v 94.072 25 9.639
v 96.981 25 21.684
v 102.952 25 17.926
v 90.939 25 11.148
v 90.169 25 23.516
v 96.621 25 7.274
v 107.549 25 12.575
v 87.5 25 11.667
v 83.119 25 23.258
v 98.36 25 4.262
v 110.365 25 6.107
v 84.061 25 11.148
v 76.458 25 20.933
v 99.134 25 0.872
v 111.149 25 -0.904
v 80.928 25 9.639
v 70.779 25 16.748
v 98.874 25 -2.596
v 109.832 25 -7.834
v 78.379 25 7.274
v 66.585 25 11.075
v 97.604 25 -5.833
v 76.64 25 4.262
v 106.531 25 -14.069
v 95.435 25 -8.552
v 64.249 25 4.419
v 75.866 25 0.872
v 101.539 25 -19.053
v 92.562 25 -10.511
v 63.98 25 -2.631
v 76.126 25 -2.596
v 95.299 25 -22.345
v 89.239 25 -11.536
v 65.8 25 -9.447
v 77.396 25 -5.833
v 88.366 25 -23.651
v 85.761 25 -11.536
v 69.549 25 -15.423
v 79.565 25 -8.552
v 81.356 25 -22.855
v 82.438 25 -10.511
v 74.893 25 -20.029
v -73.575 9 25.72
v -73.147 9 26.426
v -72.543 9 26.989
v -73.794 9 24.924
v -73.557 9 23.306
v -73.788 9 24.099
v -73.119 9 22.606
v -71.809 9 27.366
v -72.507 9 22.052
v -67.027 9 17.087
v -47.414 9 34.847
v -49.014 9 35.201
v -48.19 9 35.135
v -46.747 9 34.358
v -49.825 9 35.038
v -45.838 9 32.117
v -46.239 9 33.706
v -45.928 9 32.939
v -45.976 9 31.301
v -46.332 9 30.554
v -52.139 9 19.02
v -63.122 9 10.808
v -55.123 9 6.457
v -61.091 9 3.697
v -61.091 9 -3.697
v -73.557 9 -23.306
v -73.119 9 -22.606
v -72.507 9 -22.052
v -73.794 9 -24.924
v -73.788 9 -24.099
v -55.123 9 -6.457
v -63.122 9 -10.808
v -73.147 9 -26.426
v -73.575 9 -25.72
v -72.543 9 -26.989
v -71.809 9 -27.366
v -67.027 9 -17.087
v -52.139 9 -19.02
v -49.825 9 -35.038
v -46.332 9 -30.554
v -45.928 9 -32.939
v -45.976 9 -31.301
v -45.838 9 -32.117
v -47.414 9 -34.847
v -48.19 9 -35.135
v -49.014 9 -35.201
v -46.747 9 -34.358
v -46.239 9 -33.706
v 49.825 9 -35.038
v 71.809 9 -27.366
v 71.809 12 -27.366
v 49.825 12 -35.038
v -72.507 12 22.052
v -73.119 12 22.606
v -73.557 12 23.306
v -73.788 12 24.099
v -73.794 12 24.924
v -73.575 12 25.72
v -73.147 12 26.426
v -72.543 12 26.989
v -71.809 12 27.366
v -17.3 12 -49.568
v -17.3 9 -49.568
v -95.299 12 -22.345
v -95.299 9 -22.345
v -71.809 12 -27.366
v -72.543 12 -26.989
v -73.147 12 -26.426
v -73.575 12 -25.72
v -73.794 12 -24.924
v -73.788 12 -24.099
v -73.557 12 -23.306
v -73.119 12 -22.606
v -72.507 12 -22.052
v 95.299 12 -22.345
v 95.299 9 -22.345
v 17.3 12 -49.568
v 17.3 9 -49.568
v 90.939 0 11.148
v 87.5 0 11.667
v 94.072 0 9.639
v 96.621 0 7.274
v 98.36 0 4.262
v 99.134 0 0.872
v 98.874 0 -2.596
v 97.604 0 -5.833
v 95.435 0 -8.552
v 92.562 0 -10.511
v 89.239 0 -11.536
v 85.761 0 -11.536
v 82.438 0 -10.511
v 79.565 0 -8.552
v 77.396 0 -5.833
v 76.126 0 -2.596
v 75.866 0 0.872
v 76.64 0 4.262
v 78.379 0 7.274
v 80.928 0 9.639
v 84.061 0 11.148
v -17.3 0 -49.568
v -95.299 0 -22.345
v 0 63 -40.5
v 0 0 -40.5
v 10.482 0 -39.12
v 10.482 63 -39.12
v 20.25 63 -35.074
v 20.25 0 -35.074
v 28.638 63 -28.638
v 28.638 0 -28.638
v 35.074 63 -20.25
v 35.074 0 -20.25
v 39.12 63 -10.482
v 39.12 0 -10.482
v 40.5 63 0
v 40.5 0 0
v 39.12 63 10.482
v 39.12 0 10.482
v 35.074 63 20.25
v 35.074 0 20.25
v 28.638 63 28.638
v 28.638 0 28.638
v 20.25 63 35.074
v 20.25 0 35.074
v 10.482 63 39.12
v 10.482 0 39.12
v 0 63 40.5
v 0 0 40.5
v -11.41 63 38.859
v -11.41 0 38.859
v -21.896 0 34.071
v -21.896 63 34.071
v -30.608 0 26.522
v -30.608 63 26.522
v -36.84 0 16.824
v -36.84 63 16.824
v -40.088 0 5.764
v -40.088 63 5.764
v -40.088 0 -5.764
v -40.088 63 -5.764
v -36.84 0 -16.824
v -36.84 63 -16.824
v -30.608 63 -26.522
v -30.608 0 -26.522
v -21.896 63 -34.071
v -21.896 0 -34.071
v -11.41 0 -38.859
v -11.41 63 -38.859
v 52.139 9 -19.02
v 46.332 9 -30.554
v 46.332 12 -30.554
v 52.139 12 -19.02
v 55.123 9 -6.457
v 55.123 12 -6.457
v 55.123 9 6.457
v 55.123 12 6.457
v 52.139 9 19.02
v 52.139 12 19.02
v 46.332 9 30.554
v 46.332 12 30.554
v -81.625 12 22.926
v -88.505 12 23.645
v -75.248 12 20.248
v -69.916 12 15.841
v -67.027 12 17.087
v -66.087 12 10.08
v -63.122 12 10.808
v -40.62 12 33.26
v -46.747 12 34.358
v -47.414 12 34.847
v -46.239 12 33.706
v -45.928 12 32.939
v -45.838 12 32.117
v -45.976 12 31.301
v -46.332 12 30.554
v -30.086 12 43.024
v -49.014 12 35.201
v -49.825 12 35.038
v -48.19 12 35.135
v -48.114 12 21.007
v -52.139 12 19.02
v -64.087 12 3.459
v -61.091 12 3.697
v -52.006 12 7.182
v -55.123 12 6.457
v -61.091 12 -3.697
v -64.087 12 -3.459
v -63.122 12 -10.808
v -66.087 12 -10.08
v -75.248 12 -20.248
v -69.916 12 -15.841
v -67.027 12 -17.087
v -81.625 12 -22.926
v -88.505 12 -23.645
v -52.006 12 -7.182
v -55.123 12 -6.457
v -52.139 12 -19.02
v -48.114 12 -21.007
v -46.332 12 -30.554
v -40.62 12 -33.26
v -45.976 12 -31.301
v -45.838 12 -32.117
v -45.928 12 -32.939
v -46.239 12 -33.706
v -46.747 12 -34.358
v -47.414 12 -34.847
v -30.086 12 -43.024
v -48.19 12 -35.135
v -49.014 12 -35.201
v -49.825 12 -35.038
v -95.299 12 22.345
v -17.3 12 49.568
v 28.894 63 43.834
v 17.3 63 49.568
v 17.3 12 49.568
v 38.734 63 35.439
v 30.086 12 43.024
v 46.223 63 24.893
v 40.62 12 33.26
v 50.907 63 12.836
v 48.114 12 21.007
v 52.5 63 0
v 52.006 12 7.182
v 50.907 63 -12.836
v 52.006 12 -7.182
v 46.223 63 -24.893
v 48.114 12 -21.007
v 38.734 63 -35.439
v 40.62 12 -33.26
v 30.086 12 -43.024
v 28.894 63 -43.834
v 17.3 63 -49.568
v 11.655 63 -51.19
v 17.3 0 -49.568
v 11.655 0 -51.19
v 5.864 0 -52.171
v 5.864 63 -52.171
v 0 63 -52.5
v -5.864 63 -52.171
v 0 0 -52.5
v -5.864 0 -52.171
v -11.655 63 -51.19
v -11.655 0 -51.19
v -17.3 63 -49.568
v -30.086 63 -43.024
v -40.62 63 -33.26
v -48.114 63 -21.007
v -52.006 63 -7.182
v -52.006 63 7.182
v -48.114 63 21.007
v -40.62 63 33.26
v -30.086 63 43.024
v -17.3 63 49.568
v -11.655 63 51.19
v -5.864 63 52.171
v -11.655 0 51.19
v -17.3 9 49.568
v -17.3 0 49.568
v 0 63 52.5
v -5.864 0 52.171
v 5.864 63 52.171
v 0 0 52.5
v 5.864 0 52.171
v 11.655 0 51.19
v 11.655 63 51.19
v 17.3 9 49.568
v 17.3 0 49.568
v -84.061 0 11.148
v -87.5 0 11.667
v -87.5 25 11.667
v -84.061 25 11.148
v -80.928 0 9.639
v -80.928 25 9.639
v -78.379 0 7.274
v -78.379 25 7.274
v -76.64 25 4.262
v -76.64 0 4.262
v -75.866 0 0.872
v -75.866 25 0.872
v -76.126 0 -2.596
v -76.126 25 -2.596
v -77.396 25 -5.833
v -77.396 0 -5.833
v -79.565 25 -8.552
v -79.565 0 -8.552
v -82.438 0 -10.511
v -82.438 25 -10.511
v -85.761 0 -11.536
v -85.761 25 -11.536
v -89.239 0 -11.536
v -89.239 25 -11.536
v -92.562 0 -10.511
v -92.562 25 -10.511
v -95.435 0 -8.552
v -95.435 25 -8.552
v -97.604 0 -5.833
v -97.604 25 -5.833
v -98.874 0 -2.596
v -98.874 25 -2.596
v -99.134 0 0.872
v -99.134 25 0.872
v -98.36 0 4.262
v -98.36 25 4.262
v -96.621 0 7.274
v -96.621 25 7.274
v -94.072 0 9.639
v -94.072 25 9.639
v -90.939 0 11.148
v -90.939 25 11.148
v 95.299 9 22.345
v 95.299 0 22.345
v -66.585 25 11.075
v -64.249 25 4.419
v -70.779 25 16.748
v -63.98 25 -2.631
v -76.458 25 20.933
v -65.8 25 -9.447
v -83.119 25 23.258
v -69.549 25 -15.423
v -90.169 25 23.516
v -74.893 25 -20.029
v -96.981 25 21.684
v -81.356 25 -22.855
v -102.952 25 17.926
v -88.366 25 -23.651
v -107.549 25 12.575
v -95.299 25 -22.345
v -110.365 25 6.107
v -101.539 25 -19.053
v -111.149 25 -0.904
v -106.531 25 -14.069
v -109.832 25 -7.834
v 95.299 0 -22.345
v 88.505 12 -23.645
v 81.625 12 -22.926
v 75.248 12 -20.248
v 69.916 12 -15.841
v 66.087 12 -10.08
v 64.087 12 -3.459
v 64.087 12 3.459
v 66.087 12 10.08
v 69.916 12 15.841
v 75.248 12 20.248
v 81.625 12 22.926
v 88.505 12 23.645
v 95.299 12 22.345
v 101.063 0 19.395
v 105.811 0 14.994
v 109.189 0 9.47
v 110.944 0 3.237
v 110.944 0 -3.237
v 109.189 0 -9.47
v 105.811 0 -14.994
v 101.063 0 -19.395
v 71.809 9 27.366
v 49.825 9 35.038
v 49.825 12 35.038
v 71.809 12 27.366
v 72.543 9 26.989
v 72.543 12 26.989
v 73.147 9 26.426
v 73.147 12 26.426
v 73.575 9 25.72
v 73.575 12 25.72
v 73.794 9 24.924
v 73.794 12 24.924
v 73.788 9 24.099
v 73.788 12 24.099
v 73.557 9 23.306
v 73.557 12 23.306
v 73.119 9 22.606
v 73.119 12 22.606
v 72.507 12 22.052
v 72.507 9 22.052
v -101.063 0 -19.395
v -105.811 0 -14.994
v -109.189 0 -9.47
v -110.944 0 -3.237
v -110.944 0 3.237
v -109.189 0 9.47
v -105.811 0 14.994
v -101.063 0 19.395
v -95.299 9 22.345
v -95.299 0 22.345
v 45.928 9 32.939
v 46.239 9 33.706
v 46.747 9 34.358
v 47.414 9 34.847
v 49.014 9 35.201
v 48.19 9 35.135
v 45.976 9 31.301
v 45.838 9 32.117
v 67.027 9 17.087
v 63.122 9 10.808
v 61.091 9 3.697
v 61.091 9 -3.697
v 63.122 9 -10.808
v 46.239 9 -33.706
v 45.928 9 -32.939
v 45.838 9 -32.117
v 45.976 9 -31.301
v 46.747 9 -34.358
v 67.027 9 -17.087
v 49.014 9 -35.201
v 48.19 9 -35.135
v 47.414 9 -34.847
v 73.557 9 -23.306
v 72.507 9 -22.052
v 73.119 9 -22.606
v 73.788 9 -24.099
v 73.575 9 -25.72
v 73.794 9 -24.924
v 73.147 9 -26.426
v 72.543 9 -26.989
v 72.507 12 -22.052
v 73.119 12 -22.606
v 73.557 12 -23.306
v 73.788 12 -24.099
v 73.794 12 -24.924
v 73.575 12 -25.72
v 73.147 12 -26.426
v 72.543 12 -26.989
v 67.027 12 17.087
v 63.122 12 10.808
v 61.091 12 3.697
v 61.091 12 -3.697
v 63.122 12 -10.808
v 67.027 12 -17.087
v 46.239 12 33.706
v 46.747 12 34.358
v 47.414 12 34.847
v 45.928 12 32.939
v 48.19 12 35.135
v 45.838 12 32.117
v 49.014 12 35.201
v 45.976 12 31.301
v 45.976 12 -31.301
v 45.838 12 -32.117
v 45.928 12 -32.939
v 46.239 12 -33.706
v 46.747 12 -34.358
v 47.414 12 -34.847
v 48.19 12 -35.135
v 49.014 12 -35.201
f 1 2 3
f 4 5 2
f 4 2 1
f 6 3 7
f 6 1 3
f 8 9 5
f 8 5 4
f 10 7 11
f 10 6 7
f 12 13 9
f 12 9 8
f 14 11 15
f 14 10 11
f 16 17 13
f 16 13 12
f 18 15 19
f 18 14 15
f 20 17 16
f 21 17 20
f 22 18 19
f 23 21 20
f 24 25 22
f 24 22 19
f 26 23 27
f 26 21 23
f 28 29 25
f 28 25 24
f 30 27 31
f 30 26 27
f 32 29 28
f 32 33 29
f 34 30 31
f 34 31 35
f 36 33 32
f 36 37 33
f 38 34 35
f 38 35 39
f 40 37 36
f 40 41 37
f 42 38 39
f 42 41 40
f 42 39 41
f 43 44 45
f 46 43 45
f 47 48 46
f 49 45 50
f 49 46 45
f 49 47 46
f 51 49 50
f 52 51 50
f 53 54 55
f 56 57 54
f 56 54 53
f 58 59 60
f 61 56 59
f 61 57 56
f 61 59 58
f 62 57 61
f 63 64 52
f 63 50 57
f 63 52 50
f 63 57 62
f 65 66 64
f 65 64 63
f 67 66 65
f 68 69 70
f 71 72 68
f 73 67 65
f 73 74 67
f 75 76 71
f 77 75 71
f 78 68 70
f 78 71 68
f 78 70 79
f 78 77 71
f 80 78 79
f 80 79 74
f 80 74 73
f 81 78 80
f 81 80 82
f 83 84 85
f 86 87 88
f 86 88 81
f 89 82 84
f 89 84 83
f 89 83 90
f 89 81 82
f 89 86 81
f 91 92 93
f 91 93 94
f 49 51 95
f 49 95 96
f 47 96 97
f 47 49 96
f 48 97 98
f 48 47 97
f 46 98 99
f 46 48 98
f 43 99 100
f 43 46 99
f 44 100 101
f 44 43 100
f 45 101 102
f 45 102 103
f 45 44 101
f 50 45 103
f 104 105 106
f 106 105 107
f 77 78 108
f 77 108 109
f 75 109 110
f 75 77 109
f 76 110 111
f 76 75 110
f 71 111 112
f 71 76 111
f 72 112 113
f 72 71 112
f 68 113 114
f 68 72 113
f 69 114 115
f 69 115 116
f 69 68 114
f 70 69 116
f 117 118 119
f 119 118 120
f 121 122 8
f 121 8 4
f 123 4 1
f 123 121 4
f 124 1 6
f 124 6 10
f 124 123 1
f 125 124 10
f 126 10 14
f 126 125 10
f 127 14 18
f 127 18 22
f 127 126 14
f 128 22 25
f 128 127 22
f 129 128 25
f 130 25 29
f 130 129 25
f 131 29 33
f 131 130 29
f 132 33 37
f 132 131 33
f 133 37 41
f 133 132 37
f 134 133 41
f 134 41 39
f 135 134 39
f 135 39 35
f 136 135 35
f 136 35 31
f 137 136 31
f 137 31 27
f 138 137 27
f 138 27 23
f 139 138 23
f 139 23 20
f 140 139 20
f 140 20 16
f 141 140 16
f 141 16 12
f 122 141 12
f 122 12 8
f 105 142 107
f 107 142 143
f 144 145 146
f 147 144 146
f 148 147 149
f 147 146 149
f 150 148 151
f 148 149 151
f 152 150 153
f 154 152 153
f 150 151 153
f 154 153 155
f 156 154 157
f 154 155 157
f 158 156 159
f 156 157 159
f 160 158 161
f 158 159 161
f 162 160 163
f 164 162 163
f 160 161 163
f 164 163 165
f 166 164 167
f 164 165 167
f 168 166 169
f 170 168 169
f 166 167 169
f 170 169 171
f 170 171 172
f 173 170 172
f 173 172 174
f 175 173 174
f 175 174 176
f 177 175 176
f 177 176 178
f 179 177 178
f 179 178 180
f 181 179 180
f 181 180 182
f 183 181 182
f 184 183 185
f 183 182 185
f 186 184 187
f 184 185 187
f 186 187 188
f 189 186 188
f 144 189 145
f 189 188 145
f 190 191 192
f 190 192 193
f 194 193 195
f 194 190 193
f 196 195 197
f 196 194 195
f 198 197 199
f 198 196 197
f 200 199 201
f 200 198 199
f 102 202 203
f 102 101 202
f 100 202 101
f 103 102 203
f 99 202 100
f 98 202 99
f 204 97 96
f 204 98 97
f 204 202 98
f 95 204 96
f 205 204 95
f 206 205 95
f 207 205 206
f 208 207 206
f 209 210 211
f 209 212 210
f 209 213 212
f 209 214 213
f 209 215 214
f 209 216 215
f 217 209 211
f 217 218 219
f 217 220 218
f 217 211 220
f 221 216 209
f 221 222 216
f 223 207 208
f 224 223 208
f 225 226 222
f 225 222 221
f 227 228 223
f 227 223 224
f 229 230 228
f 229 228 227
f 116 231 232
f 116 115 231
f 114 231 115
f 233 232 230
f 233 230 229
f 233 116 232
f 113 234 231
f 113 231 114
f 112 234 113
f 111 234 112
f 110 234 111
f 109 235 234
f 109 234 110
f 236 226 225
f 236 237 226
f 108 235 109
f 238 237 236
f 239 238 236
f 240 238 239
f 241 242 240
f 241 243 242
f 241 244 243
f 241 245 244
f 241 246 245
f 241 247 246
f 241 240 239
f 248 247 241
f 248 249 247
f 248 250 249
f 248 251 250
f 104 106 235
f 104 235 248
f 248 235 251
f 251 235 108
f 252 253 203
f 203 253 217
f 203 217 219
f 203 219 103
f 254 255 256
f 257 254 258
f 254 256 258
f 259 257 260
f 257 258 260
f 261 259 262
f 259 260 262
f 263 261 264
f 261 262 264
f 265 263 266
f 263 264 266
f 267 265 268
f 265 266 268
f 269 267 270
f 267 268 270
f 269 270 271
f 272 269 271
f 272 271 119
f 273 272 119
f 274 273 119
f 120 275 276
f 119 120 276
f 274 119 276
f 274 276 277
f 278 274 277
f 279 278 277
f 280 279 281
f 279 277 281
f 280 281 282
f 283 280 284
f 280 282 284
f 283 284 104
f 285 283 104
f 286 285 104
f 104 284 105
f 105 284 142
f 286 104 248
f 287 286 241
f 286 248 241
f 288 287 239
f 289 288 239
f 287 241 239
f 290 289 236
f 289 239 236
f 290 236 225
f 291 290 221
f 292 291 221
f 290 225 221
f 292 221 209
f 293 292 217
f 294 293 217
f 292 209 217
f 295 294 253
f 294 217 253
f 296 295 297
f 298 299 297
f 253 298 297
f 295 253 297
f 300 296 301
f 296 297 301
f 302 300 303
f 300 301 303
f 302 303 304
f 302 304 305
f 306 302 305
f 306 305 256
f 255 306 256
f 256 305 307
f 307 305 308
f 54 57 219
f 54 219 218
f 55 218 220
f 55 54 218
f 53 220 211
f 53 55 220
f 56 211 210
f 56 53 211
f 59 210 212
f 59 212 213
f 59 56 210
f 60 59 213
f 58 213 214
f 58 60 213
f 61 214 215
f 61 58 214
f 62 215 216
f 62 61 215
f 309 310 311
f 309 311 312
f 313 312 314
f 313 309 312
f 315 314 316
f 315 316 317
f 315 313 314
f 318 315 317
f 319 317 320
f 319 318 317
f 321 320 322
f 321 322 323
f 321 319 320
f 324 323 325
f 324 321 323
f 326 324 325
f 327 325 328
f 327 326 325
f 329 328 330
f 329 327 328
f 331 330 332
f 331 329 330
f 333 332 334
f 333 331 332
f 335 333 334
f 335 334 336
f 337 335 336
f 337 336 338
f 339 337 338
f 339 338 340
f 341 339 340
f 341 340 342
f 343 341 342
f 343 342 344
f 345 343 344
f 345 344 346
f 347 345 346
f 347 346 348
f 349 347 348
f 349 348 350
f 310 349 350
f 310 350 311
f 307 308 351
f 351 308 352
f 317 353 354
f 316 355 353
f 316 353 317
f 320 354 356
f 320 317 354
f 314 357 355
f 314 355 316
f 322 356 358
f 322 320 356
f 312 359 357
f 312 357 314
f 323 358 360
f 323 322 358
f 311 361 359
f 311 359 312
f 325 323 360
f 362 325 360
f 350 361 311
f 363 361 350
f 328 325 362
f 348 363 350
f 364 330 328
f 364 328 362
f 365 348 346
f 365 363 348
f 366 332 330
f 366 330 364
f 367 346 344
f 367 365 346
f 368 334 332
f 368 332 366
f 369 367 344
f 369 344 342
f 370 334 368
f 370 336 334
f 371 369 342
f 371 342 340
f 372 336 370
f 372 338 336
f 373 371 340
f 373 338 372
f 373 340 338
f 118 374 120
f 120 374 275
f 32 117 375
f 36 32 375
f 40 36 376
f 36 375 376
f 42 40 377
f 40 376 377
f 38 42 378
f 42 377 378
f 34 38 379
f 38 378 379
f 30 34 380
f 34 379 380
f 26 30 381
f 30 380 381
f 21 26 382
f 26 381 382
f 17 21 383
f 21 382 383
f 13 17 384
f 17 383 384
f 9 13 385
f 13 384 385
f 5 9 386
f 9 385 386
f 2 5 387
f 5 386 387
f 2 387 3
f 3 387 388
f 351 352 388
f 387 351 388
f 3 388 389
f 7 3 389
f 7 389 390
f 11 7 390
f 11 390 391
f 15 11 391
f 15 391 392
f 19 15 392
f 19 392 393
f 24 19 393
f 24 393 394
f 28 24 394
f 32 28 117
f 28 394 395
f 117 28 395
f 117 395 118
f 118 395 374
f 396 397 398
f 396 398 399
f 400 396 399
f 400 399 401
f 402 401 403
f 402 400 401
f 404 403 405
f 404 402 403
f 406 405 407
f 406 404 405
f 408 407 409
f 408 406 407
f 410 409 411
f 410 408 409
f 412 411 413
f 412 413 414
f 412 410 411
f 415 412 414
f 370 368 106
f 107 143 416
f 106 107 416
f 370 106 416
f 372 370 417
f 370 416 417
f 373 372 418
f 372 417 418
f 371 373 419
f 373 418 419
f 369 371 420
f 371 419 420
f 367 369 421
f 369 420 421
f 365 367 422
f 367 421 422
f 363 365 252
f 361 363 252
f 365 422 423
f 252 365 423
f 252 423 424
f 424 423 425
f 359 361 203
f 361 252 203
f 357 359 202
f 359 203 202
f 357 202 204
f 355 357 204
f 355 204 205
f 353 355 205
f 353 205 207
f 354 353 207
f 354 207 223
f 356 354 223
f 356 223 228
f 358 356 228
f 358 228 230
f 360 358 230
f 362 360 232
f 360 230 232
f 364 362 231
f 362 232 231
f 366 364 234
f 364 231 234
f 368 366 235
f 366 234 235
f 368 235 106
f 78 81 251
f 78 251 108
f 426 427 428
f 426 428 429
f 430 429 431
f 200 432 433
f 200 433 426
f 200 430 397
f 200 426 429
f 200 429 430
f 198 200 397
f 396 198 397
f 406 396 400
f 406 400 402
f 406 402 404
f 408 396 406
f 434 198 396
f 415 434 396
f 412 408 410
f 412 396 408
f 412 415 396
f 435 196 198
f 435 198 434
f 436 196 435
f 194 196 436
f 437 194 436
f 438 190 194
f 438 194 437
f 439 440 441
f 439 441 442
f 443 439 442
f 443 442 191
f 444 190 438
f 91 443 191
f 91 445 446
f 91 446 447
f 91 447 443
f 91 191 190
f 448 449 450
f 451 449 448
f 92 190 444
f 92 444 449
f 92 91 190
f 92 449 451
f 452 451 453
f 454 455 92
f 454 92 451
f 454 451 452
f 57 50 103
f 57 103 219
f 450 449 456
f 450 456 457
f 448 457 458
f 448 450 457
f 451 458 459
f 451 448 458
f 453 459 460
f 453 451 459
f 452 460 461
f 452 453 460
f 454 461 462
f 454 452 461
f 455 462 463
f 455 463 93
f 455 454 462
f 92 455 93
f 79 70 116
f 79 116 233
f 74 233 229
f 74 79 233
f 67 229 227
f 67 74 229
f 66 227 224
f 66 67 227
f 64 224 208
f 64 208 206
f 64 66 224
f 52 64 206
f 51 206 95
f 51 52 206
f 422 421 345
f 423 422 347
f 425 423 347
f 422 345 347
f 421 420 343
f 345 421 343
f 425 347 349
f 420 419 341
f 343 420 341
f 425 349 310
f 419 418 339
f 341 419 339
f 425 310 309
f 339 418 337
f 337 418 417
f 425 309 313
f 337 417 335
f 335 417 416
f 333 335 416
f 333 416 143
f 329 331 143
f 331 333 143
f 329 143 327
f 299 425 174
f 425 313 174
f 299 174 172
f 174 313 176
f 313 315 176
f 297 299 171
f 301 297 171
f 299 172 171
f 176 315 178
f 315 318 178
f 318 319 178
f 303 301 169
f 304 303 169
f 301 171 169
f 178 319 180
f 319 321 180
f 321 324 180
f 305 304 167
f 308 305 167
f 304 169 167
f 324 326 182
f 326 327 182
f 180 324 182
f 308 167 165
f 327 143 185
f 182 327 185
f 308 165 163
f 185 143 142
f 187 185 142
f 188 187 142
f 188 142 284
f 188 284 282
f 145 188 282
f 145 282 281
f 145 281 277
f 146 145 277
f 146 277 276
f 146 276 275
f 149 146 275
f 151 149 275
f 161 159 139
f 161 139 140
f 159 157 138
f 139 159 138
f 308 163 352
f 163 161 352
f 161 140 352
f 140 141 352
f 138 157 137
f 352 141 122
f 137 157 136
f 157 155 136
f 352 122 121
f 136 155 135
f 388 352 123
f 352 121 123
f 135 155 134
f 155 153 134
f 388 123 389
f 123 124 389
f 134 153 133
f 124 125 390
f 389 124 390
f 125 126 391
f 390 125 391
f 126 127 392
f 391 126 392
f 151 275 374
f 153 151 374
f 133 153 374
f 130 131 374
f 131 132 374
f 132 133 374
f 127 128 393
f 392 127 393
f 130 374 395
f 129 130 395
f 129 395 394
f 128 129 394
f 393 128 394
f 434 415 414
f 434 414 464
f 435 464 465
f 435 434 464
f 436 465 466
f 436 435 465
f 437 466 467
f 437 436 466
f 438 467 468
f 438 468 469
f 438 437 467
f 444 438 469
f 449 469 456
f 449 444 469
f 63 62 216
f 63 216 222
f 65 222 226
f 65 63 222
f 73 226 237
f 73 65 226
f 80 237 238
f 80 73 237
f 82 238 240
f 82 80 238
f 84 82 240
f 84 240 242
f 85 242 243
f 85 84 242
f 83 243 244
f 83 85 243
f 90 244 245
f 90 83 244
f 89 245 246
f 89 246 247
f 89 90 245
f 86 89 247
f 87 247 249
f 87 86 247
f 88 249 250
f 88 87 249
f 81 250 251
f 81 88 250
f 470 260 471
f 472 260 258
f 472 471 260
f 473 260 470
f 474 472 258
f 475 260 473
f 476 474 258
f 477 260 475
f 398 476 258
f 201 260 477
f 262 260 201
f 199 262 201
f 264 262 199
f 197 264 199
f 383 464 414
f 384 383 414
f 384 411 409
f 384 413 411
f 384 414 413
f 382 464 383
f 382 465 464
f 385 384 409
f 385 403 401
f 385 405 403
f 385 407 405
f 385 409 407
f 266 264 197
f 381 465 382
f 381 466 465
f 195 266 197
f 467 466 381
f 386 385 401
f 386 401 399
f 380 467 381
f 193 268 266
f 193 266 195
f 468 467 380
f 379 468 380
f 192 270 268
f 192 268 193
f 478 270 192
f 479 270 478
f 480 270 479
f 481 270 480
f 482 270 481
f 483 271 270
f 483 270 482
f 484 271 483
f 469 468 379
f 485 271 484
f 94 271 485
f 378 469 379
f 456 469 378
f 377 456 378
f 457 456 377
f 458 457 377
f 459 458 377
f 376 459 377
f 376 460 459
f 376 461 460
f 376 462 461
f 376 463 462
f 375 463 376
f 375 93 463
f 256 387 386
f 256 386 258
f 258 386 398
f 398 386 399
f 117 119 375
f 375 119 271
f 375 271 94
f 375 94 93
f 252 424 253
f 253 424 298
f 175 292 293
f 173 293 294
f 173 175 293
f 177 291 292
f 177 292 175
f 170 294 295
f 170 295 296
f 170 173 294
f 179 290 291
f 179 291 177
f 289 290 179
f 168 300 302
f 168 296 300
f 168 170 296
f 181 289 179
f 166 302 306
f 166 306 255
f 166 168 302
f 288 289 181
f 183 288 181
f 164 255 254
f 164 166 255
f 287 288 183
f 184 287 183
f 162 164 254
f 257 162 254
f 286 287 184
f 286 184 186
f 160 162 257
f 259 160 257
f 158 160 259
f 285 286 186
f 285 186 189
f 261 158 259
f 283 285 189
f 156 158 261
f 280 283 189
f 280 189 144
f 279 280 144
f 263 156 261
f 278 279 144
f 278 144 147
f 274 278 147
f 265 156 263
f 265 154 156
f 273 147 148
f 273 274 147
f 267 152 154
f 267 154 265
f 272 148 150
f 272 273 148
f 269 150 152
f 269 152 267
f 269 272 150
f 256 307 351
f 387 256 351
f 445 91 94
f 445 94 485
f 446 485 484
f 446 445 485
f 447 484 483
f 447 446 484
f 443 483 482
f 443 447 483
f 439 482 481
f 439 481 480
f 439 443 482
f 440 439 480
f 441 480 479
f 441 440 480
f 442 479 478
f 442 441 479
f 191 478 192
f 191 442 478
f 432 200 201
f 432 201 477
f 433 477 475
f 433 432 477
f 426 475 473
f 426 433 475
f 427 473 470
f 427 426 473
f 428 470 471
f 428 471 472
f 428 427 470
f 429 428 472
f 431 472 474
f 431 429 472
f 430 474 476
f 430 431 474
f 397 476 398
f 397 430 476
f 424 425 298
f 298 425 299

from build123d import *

# Parameters (mm, degrees)
SKETCH1_R           = 23.666666667
SKETCH1_R_2         = 11.666666667
BOSS_EXTRUDE1_DEPTH = 9
SKETCH1_5_R         = 23.666666667
SKETCH1_5_R_2       = 11.666666667
BOSS_EXTRUDE2_DEPTH = 25
BOSS_EXTRUDE3_DEPTH = 63
BOSS_EXTRUDE4_DEPTH = 3


with BuildPart() as part:
    # Sketch1 → Boss-Extrude1 (new body)
    # profile 1 of 8: a face of its own
    with BuildSketch(Plane(origin=(0, 0, 0), x_dir=(1, 0, 0), z_dir=(0, 1, 0))):
        with Locations((-87.5, 0)):
            Circle(SKETCH1_R)
        with Locations(Location((-87.5, 0, 0), (0, 0, 270))):
            Circle(SKETCH1_R_2, mode=Mode.SUBTRACT)
    # profile 2 of 8: a face of its own
    with BuildSketch(Plane(origin=(0, 0, 0), x_dir=(1, 0, 0), z_dir=(0, 1, 0))):
        with BuildLine():
            ThreePointArc((-17.3, -49.567731439), (-52.5, 0), (-17.3, 49.567731439))
            Line((-17.3, 49.567731439), (-95.298730159, 22.344818617))
            ThreePointArc((-95.298730159, 22.344818617), (-73.797059366, 19.296127308), (-63.833333333, 0))
            ThreePointArc((-63.833333333, 0), (-73.797059366, -19.296127308), (-95.298730159, -22.344818617))
            Line((-95.298730159, -22.344818617), (-17.3, -49.567731439))
        make_face()
    # profile 3 of 8: a face of its own
    with BuildSketch(Plane(origin=(0, 0, 0), x_dir=(1, 0, 0), z_dir=(0, 1, 0))):
        with BuildLine():
            ThreePointArc((52.5, 0), (42.804789452, 30.397368307), (17.3, 49.567731439))
            ThreePointArc((17.3, 49.567731439), (8.773371628, 51.761742149), (0, 52.5))
            Line((0, 52.5), (0, 40.5))
            ThreePointArc((0, 40.5), (28.637824638, 28.637824638), (40.5, 0))
            ThreePointArc((40.5, 0), (28.637824638, -28.637824638), (0, -40.5))
            Line((0, -40.5), (0, -52.5))
            ThreePointArc((0, -52.5), (8.773371628, -51.761742149), (17.3, -49.567731439))
            ThreePointArc((17.3, -49.567731439), (42.804789452, -30.397368307), (52.5, 0))
        make_face()
    # profile 4 of 8: a face of its own
    with BuildSketch(Plane(origin=(0, 0, 0), x_dir=(1, 0, 0), z_dir=(0, 1, 0))):
        with BuildLine():
            Line((0, 40.5), (0, 52.5))
            ThreePointArc((0, 52.5), (-8.773371628, 51.761742149), (-17.3, 49.567731439))
            ThreePointArc((-17.3, 49.567731439), (-52.5, 0), (-17.3, -49.567731439))
            ThreePointArc((-17.3, -49.567731439), (-8.773371628, -51.761742149), (0, -52.5))
            Line((0, -52.5), (0, -40.5))
            ThreePointArc((0, -40.5), (-40.5, 0), (0, 40.5))
        make_face()
    # profile 5 of 8: a face of its own
    with BuildSketch(Plane(origin=(0, 0, 0), x_dir=(1, 0, 0), z_dir=(0, 1, 0))):
        with BuildLine():
            ThreePointArc((52.5, 0), (42.804789452, 30.397368307), (17.3, 49.567731439))
            ThreePointArc((17.3, 49.567731439), (8.773371628, 51.761742149), (0, 52.5))
            Line((0, 52.5), (0, 40.5))
            ThreePointArc((0, 40.5), (28.637824638, 28.637824638), (40.5, 0))
            ThreePointArc((40.5, 0), (28.637824638, -28.637824638), (0, -40.5))
            Line((0, -40.5), (0, -52.5))
            ThreePointArc((0, -52.5), (8.773371628, -51.761742149), (17.3, -49.567731439))
            ThreePointArc((17.3, -49.567731439), (42.804789452, -30.397368307), (52.5, 0))
        make_face()
    # profile 6 of 8: a face of its own
    with BuildSketch(Plane(origin=(0, 0, 0), x_dir=(1, 0, 0), z_dir=(0, 1, 0))):
        with BuildLine():
            Line((0, 40.5), (0, 52.5))
            ThreePointArc((0, 52.5), (-8.773371628, 51.761742149), (-17.3, 49.567731439))
            ThreePointArc((-17.3, 49.567731439), (-52.5, 0), (-17.3, -49.567731439))
            ThreePointArc((-17.3, -49.567731439), (-8.773371628, -51.761742149), (0, -52.5))
            Line((0, -52.5), (0, -40.5))
            ThreePointArc((0, -40.5), (-40.5, 0), (0, 40.5))
        make_face()
    # profile 7 of 8: a face of its own
    with BuildSketch(Plane(origin=(0, 0, 0), x_dir=(1, 0, 0), z_dir=(0, 1, 0))):
        with BuildLine():
            Line((95.298730159, 22.344818617), (17.3, 49.567731439))
            ThreePointArc((17.3, 49.567731439), (42.804789452, 30.397368307), (52.5, 0))
            ThreePointArc((52.5, 0), (42.804789452, -30.397368307), (17.3, -49.567731439))
            Line((17.3, -49.567731439), (95.298730159, -22.344818617))
            ThreePointArc((95.298730159, -22.344818617), (63.833333333, 0), (95.298730159, 22.344818617))
        make_face()
    # profile 8 of 8: a face of its own
    with BuildSketch(Plane(origin=(0, 0, 0), x_dir=(1, 0, 0), z_dir=(0, 1, 0))):
        with Locations((87.5, 0)):
            Circle(SKETCH1_R)
        with Locations(Location((87.5, 0, 0), (0, 0, 270))):
            Circle(SKETCH1_R_2, mode=Mode.SUBTRACT)
    extrude(amount=BOSS_EXTRUDE1_DEPTH)

    # Sketch1<5> → Boss-Extrude2 (add)
    # profile 1 of 2: a face of its own
    with BuildSketch(Plane(origin=(0, 0, 0), x_dir=(1, 0, 0), z_dir=(0, 1, 0))):
        with Locations(Location((-87.5, 0, 0), (0, 0, 109.239875225))):
            Circle(SKETCH1_5_R)
        with Locations(Location((-87.5, 0, 0), (0, 0, 270))):
            Circle(SKETCH1_5_R_2, mode=Mode.SUBTRACT)
    # profile 2 of 2: a face of its own
    with BuildSketch(Plane(origin=(0, 0, 0), x_dir=(1, 0, 0), z_dir=(0, 1, 0))):
        with Locations(Location((87.5, 0, 0), (0, 0, 70.760124775))):
            Circle(SKETCH1_5_R)
        with Locations(Location((87.5, 0, 0), (0, 0, 270))):
            Circle(SKETCH1_5_R_2, mode=Mode.SUBTRACT)
    extrude(amount=BOSS_EXTRUDE2_DEPTH)

    # Sketch1<4> → Boss-Extrude3 (add)
    with BuildSketch(Plane(origin=(0, 0, 0), x_dir=(1, 0, 0), z_dir=(0, 1, 0))):
        with BuildLine():
            ThreePointArc((52.5, 0), (42.804789452, 30.397368307), (17.3, 49.567731439))
            ThreePointArc((17.3, 49.567731439), (8.773371628, 51.761742149), (0, 52.5))
            Line((0, 52.5), (0, 40.5))
            ThreePointArc((0, 40.5), (28.637824638, 28.637824638), (40.5, 0))
            ThreePointArc((40.5, 0), (28.637824638, -28.637824638), (0, -40.5))
            Line((0, -40.5), (0, -52.5))
            ThreePointArc((0, -52.5), (8.773371628, -51.761742149), (17.3, -49.567731439))
            ThreePointArc((17.3, -49.567731439), (42.804789452, -30.397368307), (52.5, 0))
        make_face()
        with BuildLine():
            Line((0, 40.5), (0, 52.5))
            ThreePointArc((0, 52.5), (-8.773371628, 51.761742149), (-17.3, 49.567731439))
            ThreePointArc((-17.3, 49.567731439), (-52.5, 0), (-17.3, -49.567731439))
            ThreePointArc((-17.3, -49.567731439), (-8.773371628, -51.761742149), (0, -52.5))
            Line((0, -52.5), (0, -40.5))
            ThreePointArc((0, -40.5), (-40.5, 0), (0, 40.5))
        make_face()
        with BuildLine():
            ThreePointArc((52.5, 0), (42.804789452, 30.397368307), (17.3, 49.567731439))
            ThreePointArc((17.3, 49.567731439), (8.773371628, 51.761742149), (0, 52.5))
            Line((0, 52.5), (0, 40.5))
            ThreePointArc((0, 40.5), (28.637824638, 28.637824638), (40.5, 0))
            ThreePointArc((40.5, 0), (28.637824638, -28.637824638), (0, -40.5))
            Line((0, -40.5), (0, -52.5))
            ThreePointArc((0, -52.5), (8.773371628, -51.761742149), (17.3, -49.567731439))
            ThreePointArc((17.3, -49.567731439), (42.804789452, -30.397368307), (52.5, 0))
        make_face()
        with BuildLine():
            Line((0, 40.5), (0, 52.5))
            ThreePointArc((0, 52.5), (-8.773371628, 51.761742149), (-17.3, 49.567731439))
            ThreePointArc((-17.3, 49.567731439), (-52.5, 0), (-17.3, -49.567731439))
            ThreePointArc((-17.3, -49.567731439), (-8.773371628, -51.761742149), (0, -52.5))
            Line((0, -52.5), (0, -40.5))
            ThreePointArc((0, -40.5), (-40.5, 0), (0, 40.5))
        make_face()
    extrude(amount=BOSS_EXTRUDE3_DEPTH)

    # Sketch3 → Boss-Extrude4 (add)
    # profile 1 of 2: a face of its own
    with BuildSketch(Plane(origin=(0, 9, 0), x_dir=(1, 0, 0), z_dir=(0, 1, 0))):
        with BuildLine():
            Line((17.3, -49.567731439), (95.298730159, -22.344818617))
            ThreePointArc((95.298730159, -22.344818617), (63.833333333, 0), (95.298730159, 22.344818617))
            Line((95.298730159, 22.344818617), (17.3, 49.567731439))
            ThreePointArc((17.3, 49.567731439), (52.5, 0), (17.3, -49.567731439))
        make_face()
        with BuildLine():
            Line((49.82533187, -35.038354757), (71.808532445, -27.365835582))
            ThreePointArc((71.808532445, -27.365835582), (73.794392677, -24.924234284), (72.506706531, -22.052488796))
            ThreePointArc((72.506706531, -22.052488796), (60.833333333, 0), (72.506706531, 22.052488796))
            ThreePointArc((72.506706531, 22.052488796), (73.794392677, 24.924234284), (71.808532445, 27.365835582))
            Line((71.808532445, 27.365835582), (49.82533187, 35.038354757))
            ThreePointArc((49.82533187, 35.038354757), (46.470096946, 34.049524606), (46.332311188, 30.55432768))
            ThreePointArc((46.332311188, 30.55432768), (55.5, 0), (46.332311188, -30.55432768))
            ThreePointArc((46.332311188, -30.55432768), (46.470096946, -34.049524606), (49.82533187, -35.038354757))
        make_face(mode=Mode.SUBTRACT)
    # profile 2 of 2: a face of its own
    with BuildSketch(Plane(origin=(0, 9, 0), x_dir=(1, 0, 0), z_dir=(0, 1, 0))):
        with BuildLine():
            Line((-17.3, 49.567731439), (-95.298730159, 22.344818617))
            ThreePointArc((-95.298730159, 22.344818617), (-63.833333333, 0), (-95.298730159, -22.344818617))
            Line((-95.298730159, -22.344818617), (-17.3, -49.567731439))
            ThreePointArc((-17.3, -49.567731439), (-52.5, 0), (-17.3, 49.567731439))
        make_face()
        with BuildLine():
            Line((-49.82533187, 35.038354757), (-71.808532445, 27.365835582))
            ThreePointArc((-71.808532445, 27.365835582), (-73.794392677, 24.924234284), (-72.506706531, 22.052488796))
            ThreePointArc((-72.506706531, 22.052488796), (-60.833333333, 0), (-72.506706531, -22.052488796))
            ThreePointArc((-72.506706531, -22.052488796), (-73.794392677, -24.924234284), (-71.808532445, -27.365835582))
            Line((-71.808532445, -27.365835582), (-49.82533187, -35.038354757))
            ThreePointArc((-49.82533187, -35.038354757), (-46.470096946, -34.049524606), (-46.332311188, -30.55432768))
            ThreePointArc((-46.332311188, -30.55432768), (-55.5, 0), (-46.332311188, 30.55432768))
            ThreePointArc((-46.332311188, 30.55432768), (-46.470096946, 34.049524606), (-49.82533187, 35.038354757))
        make_face(mode=Mode.SUBTRACT)
    extrude(amount=BOSS_EXTRUDE4_DEPTH)


solid = part.part
